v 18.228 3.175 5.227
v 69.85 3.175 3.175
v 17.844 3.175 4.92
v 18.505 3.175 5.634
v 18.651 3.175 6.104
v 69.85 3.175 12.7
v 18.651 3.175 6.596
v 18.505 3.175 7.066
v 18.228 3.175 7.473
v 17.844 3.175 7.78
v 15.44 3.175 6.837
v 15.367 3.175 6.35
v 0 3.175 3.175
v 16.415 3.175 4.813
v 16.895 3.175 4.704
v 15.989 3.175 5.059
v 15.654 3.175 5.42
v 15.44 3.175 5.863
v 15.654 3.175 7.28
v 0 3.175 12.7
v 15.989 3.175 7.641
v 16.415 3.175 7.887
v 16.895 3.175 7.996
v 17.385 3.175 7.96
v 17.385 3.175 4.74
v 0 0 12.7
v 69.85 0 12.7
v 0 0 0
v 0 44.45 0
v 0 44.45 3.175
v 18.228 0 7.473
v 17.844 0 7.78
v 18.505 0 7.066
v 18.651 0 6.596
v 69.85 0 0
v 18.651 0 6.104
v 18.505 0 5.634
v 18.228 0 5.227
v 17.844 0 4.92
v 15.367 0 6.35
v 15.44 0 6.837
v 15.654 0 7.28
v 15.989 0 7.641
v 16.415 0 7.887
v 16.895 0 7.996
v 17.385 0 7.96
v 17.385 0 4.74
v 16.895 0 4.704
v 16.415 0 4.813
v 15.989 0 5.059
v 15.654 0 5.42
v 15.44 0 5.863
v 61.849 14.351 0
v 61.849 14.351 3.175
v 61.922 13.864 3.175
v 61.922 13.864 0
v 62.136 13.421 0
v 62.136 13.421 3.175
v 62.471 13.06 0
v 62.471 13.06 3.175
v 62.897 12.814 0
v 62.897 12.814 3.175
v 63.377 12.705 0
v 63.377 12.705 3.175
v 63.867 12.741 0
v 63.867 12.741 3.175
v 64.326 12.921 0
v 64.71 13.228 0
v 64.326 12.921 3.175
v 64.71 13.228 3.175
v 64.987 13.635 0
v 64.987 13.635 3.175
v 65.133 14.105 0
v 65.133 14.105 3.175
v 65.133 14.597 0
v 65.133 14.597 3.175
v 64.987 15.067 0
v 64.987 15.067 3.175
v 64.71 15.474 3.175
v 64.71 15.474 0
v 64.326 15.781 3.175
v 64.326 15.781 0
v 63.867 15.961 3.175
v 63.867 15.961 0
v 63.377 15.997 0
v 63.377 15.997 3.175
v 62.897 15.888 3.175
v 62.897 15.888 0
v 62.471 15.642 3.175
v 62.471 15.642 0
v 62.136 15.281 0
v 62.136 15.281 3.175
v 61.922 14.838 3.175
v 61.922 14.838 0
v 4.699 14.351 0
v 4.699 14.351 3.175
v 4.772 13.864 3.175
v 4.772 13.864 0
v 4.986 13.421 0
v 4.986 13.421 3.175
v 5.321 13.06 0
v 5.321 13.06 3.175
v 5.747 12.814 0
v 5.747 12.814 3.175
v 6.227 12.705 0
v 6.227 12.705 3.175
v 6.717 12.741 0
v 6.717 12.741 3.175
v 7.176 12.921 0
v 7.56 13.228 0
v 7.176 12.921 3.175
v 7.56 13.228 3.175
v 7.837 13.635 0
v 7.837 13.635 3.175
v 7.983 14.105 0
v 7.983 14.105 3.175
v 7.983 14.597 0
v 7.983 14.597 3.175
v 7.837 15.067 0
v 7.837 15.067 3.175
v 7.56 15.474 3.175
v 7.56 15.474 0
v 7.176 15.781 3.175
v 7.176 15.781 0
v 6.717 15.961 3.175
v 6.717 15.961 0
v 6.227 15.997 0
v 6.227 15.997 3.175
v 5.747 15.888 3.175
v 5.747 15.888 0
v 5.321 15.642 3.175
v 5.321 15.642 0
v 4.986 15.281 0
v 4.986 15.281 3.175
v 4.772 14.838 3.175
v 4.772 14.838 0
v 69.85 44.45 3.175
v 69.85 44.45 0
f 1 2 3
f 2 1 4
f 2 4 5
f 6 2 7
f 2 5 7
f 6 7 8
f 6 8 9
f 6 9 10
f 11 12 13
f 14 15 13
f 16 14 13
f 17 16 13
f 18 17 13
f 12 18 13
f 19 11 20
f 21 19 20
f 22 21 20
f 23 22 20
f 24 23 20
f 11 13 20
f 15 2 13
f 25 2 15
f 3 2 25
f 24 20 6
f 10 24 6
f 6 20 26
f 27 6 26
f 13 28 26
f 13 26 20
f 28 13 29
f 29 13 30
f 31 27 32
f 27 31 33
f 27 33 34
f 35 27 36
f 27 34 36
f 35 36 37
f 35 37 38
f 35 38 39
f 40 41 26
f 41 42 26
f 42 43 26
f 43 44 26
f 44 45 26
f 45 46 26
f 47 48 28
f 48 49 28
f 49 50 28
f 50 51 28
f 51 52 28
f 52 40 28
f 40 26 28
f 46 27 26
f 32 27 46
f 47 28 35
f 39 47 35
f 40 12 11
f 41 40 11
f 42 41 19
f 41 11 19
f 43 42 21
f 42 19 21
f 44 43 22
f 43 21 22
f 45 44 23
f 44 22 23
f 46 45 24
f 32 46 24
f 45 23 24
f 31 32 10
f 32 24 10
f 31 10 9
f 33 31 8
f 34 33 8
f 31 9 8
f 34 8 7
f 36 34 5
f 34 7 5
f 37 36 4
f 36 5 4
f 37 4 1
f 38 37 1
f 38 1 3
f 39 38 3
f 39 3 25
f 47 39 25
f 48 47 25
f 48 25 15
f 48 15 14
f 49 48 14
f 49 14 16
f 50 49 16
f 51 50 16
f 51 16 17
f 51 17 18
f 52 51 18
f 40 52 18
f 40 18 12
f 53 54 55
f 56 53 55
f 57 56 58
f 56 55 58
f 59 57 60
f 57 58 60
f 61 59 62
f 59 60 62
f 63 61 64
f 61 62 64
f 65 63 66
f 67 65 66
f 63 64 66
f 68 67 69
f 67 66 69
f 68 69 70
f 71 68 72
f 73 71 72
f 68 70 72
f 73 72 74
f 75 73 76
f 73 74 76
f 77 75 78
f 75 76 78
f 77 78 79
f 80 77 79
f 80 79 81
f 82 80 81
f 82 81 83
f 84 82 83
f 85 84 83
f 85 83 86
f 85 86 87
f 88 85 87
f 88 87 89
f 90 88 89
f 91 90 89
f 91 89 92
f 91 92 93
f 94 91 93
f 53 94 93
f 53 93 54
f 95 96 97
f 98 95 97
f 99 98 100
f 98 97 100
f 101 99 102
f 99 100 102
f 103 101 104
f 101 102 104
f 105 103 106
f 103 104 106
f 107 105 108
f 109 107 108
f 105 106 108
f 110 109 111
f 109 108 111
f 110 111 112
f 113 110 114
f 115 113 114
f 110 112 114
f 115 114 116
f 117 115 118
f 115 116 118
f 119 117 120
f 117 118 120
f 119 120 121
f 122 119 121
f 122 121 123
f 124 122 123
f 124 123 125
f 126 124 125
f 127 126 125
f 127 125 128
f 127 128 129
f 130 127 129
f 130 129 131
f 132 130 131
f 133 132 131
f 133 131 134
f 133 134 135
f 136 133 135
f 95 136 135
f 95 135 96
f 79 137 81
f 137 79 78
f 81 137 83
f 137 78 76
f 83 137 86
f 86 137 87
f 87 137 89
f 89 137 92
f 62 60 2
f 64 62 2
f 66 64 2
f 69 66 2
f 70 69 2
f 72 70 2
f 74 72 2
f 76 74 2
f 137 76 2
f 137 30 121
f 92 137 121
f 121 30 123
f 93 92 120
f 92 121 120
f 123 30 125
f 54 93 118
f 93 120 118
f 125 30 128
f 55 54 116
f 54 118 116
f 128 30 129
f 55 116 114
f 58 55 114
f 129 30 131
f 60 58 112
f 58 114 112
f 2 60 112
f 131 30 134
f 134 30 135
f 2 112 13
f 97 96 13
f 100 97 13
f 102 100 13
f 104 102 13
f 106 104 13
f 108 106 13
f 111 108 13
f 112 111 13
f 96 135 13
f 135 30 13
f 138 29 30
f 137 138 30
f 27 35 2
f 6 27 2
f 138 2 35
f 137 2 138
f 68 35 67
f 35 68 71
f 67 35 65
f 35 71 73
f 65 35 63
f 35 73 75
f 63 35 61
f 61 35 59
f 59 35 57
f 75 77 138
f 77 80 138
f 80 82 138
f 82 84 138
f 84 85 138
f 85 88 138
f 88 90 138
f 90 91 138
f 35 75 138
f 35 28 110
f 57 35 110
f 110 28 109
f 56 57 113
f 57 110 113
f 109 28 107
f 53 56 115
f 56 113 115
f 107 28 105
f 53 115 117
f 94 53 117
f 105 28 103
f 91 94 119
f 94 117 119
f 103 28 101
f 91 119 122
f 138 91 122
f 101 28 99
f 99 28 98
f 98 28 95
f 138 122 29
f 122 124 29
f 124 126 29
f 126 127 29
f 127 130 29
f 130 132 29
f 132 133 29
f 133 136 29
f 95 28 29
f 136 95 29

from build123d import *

# Parameters (mm, degrees)
F1_DEPTH = 69.85
F3_D     = 3.302
F5_D     = 3.302


with BuildPart() as f1:
    # F0 (on Right) → F1 (new body)
    with BuildSketch(Plane.YZ):
        Polygon((0, 12.7), (0, 0), (44.45, 0), (44.45, 3.175), (3.175, 3.175), (3.175, 12.7), align=None)
    extrude(amount=F1_DEPTH)

    # F3 (through all)
    with Locations(Plane(origin=(0, 0, 0), x_dir=(1, 0, 0), z_dir=(0, 0, -1))):
        with Locations((6.35, -14.351), (63.5, -14.351)):
            Hole(F3_D / 2)

    # F5 (through all)
    with Locations(Plane.XZ):
        with Locations((17.018, 6.35)):
            Hole(F5_D / 2)


solid = f1.part
